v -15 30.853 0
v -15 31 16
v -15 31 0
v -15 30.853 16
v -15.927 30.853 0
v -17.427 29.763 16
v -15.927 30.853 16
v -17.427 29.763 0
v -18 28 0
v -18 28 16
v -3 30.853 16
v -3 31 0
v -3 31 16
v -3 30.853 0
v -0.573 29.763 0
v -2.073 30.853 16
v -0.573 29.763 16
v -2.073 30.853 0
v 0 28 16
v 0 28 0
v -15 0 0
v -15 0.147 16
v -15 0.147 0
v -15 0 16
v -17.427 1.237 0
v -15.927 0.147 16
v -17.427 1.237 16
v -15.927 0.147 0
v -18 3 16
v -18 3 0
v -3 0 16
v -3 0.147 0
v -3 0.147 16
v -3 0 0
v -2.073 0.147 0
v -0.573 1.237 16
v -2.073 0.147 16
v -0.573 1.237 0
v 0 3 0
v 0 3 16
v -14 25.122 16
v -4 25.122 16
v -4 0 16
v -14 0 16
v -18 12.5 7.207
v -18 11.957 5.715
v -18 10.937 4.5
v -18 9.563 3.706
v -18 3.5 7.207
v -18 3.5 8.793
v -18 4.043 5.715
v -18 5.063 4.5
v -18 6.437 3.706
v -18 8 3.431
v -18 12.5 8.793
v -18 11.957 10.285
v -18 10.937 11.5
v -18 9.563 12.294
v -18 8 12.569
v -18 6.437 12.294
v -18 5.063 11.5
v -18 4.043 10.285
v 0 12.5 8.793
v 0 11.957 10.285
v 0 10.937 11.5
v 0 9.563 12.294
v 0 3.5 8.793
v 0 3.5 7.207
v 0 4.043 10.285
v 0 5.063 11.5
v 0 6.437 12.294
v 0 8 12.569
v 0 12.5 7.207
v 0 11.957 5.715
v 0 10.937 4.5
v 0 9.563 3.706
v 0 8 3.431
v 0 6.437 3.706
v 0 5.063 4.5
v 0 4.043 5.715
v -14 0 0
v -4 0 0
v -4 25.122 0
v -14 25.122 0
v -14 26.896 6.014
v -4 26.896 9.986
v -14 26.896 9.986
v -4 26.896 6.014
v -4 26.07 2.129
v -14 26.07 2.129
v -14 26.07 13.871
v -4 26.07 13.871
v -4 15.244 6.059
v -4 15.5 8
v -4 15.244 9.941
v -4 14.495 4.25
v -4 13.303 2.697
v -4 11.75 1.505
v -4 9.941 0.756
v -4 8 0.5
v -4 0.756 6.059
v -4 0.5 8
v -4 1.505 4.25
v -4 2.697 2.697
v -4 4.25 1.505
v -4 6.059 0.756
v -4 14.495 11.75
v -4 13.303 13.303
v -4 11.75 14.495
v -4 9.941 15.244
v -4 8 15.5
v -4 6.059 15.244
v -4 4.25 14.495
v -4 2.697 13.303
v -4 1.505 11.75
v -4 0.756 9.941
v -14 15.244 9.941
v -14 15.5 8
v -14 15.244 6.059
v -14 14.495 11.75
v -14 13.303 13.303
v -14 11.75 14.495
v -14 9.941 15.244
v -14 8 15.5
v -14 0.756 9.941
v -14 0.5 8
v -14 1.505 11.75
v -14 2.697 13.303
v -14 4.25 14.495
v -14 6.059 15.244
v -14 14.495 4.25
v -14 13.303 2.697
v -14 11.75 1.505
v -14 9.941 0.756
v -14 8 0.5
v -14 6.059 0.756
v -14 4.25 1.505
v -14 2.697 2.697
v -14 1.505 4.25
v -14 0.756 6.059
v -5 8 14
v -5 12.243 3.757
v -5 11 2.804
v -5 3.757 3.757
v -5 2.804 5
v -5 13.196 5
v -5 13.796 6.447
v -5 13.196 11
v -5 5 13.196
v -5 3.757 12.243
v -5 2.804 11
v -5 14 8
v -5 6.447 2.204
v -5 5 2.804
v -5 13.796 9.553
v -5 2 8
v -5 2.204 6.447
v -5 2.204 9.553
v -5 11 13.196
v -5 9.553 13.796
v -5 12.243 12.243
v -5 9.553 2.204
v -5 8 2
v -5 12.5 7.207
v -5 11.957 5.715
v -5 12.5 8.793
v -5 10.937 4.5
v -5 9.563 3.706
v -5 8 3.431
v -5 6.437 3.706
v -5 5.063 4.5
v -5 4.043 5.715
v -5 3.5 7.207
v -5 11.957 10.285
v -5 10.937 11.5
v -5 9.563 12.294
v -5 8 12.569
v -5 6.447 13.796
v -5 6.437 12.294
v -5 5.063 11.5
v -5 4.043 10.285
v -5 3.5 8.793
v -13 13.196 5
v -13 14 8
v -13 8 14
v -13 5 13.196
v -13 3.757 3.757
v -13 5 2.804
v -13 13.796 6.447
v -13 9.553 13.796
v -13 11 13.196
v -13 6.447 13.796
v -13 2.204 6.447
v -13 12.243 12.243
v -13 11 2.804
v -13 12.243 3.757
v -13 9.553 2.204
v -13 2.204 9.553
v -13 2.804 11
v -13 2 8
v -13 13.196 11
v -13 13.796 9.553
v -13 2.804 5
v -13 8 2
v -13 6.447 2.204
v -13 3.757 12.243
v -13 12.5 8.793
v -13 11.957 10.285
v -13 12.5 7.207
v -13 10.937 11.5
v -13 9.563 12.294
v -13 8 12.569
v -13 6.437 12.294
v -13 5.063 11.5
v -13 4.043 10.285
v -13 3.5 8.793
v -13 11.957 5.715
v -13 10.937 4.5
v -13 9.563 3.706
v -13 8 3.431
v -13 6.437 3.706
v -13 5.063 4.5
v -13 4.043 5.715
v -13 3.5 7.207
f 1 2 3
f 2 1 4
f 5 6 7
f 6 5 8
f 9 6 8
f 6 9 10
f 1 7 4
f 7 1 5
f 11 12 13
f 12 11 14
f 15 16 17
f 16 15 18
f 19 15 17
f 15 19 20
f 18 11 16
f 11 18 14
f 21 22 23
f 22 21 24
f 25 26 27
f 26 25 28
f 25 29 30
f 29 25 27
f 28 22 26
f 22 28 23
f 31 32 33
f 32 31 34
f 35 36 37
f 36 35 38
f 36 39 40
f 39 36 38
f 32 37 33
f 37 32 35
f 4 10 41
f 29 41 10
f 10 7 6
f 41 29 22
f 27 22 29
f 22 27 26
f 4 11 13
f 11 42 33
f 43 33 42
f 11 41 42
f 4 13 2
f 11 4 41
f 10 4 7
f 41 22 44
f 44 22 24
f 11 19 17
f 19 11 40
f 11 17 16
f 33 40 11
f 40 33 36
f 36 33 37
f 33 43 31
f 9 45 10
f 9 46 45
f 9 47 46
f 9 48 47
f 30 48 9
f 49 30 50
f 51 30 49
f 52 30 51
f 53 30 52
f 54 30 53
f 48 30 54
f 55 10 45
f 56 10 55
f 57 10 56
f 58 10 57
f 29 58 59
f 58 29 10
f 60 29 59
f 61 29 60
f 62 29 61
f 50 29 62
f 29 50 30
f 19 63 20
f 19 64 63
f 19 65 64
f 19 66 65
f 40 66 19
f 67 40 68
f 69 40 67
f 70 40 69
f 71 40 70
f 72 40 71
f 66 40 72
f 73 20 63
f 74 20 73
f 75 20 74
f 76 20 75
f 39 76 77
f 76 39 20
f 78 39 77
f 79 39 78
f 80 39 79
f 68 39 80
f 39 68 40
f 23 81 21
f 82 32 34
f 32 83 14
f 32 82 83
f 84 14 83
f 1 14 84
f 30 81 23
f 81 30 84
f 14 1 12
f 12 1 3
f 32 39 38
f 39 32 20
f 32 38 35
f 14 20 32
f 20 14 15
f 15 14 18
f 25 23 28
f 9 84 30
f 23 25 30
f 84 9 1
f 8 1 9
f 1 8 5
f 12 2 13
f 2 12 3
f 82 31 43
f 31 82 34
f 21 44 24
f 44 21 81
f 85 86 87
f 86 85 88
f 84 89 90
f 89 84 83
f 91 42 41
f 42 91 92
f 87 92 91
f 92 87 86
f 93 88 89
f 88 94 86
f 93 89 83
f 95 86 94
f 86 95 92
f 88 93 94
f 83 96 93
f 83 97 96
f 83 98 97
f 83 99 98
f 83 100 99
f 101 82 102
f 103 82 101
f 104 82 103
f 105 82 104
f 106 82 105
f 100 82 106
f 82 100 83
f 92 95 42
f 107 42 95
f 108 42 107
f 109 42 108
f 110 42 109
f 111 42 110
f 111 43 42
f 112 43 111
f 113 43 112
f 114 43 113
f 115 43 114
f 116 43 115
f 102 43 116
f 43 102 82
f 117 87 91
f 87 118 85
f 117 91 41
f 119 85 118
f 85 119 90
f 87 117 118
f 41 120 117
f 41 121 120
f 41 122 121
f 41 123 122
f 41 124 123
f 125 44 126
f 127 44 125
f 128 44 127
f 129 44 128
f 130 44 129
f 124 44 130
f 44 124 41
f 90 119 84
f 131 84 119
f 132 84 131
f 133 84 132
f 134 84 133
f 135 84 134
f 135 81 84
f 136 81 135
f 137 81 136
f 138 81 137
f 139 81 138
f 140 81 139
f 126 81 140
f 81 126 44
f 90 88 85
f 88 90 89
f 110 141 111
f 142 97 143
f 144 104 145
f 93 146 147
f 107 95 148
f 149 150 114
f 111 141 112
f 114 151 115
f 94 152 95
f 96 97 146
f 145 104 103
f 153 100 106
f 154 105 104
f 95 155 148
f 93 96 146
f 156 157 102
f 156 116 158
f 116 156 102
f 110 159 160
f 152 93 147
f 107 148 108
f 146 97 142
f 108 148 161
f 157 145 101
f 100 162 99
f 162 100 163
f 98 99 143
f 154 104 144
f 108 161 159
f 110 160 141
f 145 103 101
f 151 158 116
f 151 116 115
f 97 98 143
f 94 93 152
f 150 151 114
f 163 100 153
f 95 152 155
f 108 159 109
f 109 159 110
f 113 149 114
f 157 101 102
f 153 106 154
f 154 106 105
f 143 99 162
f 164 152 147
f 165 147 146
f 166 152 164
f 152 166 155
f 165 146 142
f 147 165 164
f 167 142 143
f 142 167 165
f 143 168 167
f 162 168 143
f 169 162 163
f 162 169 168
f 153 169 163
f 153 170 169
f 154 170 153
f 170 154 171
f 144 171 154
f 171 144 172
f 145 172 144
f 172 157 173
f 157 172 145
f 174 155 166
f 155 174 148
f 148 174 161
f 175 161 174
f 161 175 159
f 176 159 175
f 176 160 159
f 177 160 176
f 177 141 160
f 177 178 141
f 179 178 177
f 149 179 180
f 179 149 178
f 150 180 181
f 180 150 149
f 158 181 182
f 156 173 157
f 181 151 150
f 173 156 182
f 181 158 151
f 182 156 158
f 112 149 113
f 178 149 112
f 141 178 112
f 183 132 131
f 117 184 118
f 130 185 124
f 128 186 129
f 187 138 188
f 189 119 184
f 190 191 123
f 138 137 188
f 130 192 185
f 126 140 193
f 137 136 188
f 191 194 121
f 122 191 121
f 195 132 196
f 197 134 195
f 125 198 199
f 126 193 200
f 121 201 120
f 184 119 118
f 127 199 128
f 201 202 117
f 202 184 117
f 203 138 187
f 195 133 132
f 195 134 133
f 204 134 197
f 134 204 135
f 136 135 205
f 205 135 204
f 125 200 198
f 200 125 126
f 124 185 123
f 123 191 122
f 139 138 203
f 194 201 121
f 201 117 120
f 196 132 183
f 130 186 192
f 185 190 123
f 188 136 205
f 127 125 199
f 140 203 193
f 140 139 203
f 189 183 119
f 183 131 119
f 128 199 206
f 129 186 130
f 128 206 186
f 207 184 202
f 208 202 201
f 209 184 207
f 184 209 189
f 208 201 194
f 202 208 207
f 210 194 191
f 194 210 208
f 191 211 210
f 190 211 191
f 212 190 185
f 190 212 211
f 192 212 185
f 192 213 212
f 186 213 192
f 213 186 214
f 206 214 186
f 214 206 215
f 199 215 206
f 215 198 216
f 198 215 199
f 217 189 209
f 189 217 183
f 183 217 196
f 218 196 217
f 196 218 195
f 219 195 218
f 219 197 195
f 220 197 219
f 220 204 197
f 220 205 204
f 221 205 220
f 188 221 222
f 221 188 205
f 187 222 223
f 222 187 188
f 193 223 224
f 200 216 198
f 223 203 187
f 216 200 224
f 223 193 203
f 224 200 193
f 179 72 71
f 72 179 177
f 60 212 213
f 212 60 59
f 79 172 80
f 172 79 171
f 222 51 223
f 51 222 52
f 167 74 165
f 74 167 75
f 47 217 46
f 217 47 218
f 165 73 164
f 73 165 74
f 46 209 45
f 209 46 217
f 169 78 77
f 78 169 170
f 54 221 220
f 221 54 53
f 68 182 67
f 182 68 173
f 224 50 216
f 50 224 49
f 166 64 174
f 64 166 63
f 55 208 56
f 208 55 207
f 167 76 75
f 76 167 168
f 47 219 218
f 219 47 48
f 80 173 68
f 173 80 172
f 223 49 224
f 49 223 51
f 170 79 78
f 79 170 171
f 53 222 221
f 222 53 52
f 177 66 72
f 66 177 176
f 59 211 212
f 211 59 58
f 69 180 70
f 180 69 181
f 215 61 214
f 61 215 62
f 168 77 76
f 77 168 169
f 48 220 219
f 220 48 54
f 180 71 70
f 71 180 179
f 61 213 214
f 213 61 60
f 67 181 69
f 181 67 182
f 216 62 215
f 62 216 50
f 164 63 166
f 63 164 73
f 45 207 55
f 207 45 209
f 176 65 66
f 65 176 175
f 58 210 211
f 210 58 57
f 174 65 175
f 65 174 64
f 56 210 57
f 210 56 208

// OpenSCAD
// file: inc/functions.scad
// PRUSA iteration3
// Functions used in many files
// GNU GPL v3
// Josef Průša <josefprusa@me.com>
// Václav 'ax' Hůla <axtheb@gmail.com>
// Vlnofka <>
// http://www.reprap.org/wiki/Prusa_Mendel
// http://github.com/prusajr/PrusaMendel


module nut(d,h, horizontal=true, center=false) {
    cornerdiameter = (d / 2) / cos (180 / 6);
    cylinder(h = h, r = cornerdiameter, center=center, $fn = 6);
    if(horizontal) {
        for(i = [1:6]) {
            rotate([0,0,60*i]) translate([-cornerdiameter-0.2,0,center ? h/2 : 0]) rotate([0,0,-45]) cube([2,2,h]);
        }
    }
}

// Based on nophead research
module polyhole(d, h, center=false) {
    n = max(round(2 * d),3);
    rotate([0,0,180])
        cylinder(h = h, r = (d / 2) / cos (180 / n), center=center, $fn = n);
}

// make it interchangeable between this and cylinder
module cylinder_poly(r, h, center=false){
    polyhole(d=r*2, h=h, center=center);
}

module fillet(radius, height=100, $fn=0) {
    //this creates acutal fillet
    translate([-radius, -radius, -height/2-0.01])
        difference() {
            cube([radius*2, radius*2, height+0.02]);
            cylinder(r=radius, h=height+0.02, $fn=$fn);
        }
}

module cube_fillet(size, radius=-1, vertical=[3,3,3,3], top=[0,0,0,0], bottom=[0,0,0,0], center=false, $fn=0){
    //
    if (center) {
        cube_fillet_inside(size, radius, vertical, top, bottom, $fn);
    } else {
        translate([size[0]/2, size[1]/2, size[2]/2])
            cube_fillet_inside(size, radius, vertical, top, bottom, $fn);
    }
}

module cube_negative_fillet(size, radius=-1, vertical=[3,3,3,3], top=[0,0,0,0], bottom=[0,0,0,0], $fn=0){

    j=[1,0,1,0];

    for (i=[0:3]) {
        if (radius > -1) {
            rotate([0, 0, 90*i]) translate([size[1-j[i]]/2, size[j[i]]/2, 0]) fillet(radius, size[2], $fn=$fn);
        } else {
            rotate([0, 0, 90*i]) translate([size[1-j[i]]/2, size[j[i]]/2, 0]) fillet(vertical[i], size[2], $fn=$fn);
        }
        rotate([90*i, -90, 0]) translate([size[2]/2, size[j[i]]/2, 0 ]) fillet(top[i], size[1-j[i]], $fn=$fn);
        rotate([90*(4-i), 90, 0]) translate([size[2]/2, size[j[i]]/2, 0]) fillet(bottom[i], size[1-j[i]], $fn=$fn);

    }
}

module cube_fillet_inside(size, radius=-1, vertical=[3,3,3,3], top=[0,0,0,0], bottom=[0,0,0,0], $fn=0){
    //makes CENTERED cube with round corners
    // if you give it radius, it will fillet vertical corners.
    //othervise use vertical, top, bottom arrays
    //when viewed from top, it starts in upper right corner (+x,+y quadrant) , goes counterclockwise
    //top/bottom fillet starts in direction of Y axis and goes CCW too


    if (radius == 0) {
        cube(size, center=true);
    } else {
        difference() {
            cube(size, center=true);
            cube_negative_fillet(size, radius, vertical, top, bottom, $fn);
        }
    }
}


module nema17(places=[1,1,1,1], size=15.5, h=10, holes=false, shadow=false, $fn=24){
    for (i=[0:3]) {
        if (places[i] == 1) {
            rotate([0, 0, 90*i]) translate([size, size, 0]) {
                if (holes) {
                    #rotate([0, 0, -90*i])  translate([0,0,-10]) screw(r=1.7, slant=false, head_drop=13, $fn=$fn, h=h+12);
                } else {
                    rotate([0, 0, -90*i]) cylinder(h=h, r=5.5, $fn=$fn);
                }
            }
        }
    }
    if (shadow != false) {
        %translate ([0, 0, shadow+21+3]) cube([42,42,42], center = true);
    //flange
        %translate ([0, 0, shadow+21+3-21-1]) cylinder(r=11,h=2, center = true, $fn=20);
    //shaft
        %translate ([0, 0, shadow+21+3-21-7]) cylinder(r=2.5,h=14, center = true);
    }
}

module screw(h=20, r=2, r_head=3.5, head_drop=0, slant=true, poly=false, $fn=0){
    //makes screw with head
    //for substraction as screw hole
    if (poly) {
        cylinder_poly(h=h, r=r, $fn=$fn);
    } else {
        cylinder(h=h, r=r, $fn=$fn);
    }
    if (slant) {
        translate([0, 0, head_drop-0.01]) cylinder(h=r_head, r2=0, r1=r_head, $fn=$fn);
    }

    if (head_drop > 0) {
        translate([0, 0, -0.01]) cylinder(h=head_drop+0.01, r=r_head, $fn=$fn);
    }
}

//cube_fillet([10,20,30], vertical=[3,2,0,0], top=[3,2,0,5], bottom=[3,2,0,5]);
//cube_fillet([10,20,30], radius=2, top=[7,2,7,2]);
// main file
// PRUSA iteration3
// Y drivetrain (idler and stepper holders)
// GNU GPL v3
// Josef Průša <josefprusa@me.com>
// Václav 'ax' Hůla <axtheb@gmail.com>
// http://www.reprap.org/wiki/Prusa_Mendel
// http://github.com/prusajr/PrusaMendel

//include <configuration.scad>
include <inc/functions.scad>

idler_width = 8;
idler_size_inner_r = 4.5;
single_wall_width = 0.3*2.2;
idler_size = 22;

module idlermount() {
	difference() {
		union() {
			difference() {
				// The body
				translate([0,0,0]) cube_fillet([16,31,10+idler_width], vertical = [0,0,0,0], top = [3,0,3,0], bottom = [3,0,3,0]);

				translate([8,8,4]) {
					// the fake bearing
					%translate([0,0,1]) cylinder(h = idler_width, r=(idler_size/2)+2*single_wall_width);
					// The bearing slot
					cylinder(h = idler_width+2, r=(idler_size/2)+8);
				}
			}
			
			// The two bumps around the center of the bearing
			translate([8,8,4]) cylinder(r1=15/2, r2=12/2,h=1);
			translate([8,8,idler_width+6]) rotate([0,180,0]) cylinder(r1=15/2, r2=12/2,h=1);
		}
		
		// the rod hole
		translate([8,8,-1]) polyhole(h = 120, d=idler_size_inner_r*2);
	}
}

rotate([0,-90,0]) idlermount();
